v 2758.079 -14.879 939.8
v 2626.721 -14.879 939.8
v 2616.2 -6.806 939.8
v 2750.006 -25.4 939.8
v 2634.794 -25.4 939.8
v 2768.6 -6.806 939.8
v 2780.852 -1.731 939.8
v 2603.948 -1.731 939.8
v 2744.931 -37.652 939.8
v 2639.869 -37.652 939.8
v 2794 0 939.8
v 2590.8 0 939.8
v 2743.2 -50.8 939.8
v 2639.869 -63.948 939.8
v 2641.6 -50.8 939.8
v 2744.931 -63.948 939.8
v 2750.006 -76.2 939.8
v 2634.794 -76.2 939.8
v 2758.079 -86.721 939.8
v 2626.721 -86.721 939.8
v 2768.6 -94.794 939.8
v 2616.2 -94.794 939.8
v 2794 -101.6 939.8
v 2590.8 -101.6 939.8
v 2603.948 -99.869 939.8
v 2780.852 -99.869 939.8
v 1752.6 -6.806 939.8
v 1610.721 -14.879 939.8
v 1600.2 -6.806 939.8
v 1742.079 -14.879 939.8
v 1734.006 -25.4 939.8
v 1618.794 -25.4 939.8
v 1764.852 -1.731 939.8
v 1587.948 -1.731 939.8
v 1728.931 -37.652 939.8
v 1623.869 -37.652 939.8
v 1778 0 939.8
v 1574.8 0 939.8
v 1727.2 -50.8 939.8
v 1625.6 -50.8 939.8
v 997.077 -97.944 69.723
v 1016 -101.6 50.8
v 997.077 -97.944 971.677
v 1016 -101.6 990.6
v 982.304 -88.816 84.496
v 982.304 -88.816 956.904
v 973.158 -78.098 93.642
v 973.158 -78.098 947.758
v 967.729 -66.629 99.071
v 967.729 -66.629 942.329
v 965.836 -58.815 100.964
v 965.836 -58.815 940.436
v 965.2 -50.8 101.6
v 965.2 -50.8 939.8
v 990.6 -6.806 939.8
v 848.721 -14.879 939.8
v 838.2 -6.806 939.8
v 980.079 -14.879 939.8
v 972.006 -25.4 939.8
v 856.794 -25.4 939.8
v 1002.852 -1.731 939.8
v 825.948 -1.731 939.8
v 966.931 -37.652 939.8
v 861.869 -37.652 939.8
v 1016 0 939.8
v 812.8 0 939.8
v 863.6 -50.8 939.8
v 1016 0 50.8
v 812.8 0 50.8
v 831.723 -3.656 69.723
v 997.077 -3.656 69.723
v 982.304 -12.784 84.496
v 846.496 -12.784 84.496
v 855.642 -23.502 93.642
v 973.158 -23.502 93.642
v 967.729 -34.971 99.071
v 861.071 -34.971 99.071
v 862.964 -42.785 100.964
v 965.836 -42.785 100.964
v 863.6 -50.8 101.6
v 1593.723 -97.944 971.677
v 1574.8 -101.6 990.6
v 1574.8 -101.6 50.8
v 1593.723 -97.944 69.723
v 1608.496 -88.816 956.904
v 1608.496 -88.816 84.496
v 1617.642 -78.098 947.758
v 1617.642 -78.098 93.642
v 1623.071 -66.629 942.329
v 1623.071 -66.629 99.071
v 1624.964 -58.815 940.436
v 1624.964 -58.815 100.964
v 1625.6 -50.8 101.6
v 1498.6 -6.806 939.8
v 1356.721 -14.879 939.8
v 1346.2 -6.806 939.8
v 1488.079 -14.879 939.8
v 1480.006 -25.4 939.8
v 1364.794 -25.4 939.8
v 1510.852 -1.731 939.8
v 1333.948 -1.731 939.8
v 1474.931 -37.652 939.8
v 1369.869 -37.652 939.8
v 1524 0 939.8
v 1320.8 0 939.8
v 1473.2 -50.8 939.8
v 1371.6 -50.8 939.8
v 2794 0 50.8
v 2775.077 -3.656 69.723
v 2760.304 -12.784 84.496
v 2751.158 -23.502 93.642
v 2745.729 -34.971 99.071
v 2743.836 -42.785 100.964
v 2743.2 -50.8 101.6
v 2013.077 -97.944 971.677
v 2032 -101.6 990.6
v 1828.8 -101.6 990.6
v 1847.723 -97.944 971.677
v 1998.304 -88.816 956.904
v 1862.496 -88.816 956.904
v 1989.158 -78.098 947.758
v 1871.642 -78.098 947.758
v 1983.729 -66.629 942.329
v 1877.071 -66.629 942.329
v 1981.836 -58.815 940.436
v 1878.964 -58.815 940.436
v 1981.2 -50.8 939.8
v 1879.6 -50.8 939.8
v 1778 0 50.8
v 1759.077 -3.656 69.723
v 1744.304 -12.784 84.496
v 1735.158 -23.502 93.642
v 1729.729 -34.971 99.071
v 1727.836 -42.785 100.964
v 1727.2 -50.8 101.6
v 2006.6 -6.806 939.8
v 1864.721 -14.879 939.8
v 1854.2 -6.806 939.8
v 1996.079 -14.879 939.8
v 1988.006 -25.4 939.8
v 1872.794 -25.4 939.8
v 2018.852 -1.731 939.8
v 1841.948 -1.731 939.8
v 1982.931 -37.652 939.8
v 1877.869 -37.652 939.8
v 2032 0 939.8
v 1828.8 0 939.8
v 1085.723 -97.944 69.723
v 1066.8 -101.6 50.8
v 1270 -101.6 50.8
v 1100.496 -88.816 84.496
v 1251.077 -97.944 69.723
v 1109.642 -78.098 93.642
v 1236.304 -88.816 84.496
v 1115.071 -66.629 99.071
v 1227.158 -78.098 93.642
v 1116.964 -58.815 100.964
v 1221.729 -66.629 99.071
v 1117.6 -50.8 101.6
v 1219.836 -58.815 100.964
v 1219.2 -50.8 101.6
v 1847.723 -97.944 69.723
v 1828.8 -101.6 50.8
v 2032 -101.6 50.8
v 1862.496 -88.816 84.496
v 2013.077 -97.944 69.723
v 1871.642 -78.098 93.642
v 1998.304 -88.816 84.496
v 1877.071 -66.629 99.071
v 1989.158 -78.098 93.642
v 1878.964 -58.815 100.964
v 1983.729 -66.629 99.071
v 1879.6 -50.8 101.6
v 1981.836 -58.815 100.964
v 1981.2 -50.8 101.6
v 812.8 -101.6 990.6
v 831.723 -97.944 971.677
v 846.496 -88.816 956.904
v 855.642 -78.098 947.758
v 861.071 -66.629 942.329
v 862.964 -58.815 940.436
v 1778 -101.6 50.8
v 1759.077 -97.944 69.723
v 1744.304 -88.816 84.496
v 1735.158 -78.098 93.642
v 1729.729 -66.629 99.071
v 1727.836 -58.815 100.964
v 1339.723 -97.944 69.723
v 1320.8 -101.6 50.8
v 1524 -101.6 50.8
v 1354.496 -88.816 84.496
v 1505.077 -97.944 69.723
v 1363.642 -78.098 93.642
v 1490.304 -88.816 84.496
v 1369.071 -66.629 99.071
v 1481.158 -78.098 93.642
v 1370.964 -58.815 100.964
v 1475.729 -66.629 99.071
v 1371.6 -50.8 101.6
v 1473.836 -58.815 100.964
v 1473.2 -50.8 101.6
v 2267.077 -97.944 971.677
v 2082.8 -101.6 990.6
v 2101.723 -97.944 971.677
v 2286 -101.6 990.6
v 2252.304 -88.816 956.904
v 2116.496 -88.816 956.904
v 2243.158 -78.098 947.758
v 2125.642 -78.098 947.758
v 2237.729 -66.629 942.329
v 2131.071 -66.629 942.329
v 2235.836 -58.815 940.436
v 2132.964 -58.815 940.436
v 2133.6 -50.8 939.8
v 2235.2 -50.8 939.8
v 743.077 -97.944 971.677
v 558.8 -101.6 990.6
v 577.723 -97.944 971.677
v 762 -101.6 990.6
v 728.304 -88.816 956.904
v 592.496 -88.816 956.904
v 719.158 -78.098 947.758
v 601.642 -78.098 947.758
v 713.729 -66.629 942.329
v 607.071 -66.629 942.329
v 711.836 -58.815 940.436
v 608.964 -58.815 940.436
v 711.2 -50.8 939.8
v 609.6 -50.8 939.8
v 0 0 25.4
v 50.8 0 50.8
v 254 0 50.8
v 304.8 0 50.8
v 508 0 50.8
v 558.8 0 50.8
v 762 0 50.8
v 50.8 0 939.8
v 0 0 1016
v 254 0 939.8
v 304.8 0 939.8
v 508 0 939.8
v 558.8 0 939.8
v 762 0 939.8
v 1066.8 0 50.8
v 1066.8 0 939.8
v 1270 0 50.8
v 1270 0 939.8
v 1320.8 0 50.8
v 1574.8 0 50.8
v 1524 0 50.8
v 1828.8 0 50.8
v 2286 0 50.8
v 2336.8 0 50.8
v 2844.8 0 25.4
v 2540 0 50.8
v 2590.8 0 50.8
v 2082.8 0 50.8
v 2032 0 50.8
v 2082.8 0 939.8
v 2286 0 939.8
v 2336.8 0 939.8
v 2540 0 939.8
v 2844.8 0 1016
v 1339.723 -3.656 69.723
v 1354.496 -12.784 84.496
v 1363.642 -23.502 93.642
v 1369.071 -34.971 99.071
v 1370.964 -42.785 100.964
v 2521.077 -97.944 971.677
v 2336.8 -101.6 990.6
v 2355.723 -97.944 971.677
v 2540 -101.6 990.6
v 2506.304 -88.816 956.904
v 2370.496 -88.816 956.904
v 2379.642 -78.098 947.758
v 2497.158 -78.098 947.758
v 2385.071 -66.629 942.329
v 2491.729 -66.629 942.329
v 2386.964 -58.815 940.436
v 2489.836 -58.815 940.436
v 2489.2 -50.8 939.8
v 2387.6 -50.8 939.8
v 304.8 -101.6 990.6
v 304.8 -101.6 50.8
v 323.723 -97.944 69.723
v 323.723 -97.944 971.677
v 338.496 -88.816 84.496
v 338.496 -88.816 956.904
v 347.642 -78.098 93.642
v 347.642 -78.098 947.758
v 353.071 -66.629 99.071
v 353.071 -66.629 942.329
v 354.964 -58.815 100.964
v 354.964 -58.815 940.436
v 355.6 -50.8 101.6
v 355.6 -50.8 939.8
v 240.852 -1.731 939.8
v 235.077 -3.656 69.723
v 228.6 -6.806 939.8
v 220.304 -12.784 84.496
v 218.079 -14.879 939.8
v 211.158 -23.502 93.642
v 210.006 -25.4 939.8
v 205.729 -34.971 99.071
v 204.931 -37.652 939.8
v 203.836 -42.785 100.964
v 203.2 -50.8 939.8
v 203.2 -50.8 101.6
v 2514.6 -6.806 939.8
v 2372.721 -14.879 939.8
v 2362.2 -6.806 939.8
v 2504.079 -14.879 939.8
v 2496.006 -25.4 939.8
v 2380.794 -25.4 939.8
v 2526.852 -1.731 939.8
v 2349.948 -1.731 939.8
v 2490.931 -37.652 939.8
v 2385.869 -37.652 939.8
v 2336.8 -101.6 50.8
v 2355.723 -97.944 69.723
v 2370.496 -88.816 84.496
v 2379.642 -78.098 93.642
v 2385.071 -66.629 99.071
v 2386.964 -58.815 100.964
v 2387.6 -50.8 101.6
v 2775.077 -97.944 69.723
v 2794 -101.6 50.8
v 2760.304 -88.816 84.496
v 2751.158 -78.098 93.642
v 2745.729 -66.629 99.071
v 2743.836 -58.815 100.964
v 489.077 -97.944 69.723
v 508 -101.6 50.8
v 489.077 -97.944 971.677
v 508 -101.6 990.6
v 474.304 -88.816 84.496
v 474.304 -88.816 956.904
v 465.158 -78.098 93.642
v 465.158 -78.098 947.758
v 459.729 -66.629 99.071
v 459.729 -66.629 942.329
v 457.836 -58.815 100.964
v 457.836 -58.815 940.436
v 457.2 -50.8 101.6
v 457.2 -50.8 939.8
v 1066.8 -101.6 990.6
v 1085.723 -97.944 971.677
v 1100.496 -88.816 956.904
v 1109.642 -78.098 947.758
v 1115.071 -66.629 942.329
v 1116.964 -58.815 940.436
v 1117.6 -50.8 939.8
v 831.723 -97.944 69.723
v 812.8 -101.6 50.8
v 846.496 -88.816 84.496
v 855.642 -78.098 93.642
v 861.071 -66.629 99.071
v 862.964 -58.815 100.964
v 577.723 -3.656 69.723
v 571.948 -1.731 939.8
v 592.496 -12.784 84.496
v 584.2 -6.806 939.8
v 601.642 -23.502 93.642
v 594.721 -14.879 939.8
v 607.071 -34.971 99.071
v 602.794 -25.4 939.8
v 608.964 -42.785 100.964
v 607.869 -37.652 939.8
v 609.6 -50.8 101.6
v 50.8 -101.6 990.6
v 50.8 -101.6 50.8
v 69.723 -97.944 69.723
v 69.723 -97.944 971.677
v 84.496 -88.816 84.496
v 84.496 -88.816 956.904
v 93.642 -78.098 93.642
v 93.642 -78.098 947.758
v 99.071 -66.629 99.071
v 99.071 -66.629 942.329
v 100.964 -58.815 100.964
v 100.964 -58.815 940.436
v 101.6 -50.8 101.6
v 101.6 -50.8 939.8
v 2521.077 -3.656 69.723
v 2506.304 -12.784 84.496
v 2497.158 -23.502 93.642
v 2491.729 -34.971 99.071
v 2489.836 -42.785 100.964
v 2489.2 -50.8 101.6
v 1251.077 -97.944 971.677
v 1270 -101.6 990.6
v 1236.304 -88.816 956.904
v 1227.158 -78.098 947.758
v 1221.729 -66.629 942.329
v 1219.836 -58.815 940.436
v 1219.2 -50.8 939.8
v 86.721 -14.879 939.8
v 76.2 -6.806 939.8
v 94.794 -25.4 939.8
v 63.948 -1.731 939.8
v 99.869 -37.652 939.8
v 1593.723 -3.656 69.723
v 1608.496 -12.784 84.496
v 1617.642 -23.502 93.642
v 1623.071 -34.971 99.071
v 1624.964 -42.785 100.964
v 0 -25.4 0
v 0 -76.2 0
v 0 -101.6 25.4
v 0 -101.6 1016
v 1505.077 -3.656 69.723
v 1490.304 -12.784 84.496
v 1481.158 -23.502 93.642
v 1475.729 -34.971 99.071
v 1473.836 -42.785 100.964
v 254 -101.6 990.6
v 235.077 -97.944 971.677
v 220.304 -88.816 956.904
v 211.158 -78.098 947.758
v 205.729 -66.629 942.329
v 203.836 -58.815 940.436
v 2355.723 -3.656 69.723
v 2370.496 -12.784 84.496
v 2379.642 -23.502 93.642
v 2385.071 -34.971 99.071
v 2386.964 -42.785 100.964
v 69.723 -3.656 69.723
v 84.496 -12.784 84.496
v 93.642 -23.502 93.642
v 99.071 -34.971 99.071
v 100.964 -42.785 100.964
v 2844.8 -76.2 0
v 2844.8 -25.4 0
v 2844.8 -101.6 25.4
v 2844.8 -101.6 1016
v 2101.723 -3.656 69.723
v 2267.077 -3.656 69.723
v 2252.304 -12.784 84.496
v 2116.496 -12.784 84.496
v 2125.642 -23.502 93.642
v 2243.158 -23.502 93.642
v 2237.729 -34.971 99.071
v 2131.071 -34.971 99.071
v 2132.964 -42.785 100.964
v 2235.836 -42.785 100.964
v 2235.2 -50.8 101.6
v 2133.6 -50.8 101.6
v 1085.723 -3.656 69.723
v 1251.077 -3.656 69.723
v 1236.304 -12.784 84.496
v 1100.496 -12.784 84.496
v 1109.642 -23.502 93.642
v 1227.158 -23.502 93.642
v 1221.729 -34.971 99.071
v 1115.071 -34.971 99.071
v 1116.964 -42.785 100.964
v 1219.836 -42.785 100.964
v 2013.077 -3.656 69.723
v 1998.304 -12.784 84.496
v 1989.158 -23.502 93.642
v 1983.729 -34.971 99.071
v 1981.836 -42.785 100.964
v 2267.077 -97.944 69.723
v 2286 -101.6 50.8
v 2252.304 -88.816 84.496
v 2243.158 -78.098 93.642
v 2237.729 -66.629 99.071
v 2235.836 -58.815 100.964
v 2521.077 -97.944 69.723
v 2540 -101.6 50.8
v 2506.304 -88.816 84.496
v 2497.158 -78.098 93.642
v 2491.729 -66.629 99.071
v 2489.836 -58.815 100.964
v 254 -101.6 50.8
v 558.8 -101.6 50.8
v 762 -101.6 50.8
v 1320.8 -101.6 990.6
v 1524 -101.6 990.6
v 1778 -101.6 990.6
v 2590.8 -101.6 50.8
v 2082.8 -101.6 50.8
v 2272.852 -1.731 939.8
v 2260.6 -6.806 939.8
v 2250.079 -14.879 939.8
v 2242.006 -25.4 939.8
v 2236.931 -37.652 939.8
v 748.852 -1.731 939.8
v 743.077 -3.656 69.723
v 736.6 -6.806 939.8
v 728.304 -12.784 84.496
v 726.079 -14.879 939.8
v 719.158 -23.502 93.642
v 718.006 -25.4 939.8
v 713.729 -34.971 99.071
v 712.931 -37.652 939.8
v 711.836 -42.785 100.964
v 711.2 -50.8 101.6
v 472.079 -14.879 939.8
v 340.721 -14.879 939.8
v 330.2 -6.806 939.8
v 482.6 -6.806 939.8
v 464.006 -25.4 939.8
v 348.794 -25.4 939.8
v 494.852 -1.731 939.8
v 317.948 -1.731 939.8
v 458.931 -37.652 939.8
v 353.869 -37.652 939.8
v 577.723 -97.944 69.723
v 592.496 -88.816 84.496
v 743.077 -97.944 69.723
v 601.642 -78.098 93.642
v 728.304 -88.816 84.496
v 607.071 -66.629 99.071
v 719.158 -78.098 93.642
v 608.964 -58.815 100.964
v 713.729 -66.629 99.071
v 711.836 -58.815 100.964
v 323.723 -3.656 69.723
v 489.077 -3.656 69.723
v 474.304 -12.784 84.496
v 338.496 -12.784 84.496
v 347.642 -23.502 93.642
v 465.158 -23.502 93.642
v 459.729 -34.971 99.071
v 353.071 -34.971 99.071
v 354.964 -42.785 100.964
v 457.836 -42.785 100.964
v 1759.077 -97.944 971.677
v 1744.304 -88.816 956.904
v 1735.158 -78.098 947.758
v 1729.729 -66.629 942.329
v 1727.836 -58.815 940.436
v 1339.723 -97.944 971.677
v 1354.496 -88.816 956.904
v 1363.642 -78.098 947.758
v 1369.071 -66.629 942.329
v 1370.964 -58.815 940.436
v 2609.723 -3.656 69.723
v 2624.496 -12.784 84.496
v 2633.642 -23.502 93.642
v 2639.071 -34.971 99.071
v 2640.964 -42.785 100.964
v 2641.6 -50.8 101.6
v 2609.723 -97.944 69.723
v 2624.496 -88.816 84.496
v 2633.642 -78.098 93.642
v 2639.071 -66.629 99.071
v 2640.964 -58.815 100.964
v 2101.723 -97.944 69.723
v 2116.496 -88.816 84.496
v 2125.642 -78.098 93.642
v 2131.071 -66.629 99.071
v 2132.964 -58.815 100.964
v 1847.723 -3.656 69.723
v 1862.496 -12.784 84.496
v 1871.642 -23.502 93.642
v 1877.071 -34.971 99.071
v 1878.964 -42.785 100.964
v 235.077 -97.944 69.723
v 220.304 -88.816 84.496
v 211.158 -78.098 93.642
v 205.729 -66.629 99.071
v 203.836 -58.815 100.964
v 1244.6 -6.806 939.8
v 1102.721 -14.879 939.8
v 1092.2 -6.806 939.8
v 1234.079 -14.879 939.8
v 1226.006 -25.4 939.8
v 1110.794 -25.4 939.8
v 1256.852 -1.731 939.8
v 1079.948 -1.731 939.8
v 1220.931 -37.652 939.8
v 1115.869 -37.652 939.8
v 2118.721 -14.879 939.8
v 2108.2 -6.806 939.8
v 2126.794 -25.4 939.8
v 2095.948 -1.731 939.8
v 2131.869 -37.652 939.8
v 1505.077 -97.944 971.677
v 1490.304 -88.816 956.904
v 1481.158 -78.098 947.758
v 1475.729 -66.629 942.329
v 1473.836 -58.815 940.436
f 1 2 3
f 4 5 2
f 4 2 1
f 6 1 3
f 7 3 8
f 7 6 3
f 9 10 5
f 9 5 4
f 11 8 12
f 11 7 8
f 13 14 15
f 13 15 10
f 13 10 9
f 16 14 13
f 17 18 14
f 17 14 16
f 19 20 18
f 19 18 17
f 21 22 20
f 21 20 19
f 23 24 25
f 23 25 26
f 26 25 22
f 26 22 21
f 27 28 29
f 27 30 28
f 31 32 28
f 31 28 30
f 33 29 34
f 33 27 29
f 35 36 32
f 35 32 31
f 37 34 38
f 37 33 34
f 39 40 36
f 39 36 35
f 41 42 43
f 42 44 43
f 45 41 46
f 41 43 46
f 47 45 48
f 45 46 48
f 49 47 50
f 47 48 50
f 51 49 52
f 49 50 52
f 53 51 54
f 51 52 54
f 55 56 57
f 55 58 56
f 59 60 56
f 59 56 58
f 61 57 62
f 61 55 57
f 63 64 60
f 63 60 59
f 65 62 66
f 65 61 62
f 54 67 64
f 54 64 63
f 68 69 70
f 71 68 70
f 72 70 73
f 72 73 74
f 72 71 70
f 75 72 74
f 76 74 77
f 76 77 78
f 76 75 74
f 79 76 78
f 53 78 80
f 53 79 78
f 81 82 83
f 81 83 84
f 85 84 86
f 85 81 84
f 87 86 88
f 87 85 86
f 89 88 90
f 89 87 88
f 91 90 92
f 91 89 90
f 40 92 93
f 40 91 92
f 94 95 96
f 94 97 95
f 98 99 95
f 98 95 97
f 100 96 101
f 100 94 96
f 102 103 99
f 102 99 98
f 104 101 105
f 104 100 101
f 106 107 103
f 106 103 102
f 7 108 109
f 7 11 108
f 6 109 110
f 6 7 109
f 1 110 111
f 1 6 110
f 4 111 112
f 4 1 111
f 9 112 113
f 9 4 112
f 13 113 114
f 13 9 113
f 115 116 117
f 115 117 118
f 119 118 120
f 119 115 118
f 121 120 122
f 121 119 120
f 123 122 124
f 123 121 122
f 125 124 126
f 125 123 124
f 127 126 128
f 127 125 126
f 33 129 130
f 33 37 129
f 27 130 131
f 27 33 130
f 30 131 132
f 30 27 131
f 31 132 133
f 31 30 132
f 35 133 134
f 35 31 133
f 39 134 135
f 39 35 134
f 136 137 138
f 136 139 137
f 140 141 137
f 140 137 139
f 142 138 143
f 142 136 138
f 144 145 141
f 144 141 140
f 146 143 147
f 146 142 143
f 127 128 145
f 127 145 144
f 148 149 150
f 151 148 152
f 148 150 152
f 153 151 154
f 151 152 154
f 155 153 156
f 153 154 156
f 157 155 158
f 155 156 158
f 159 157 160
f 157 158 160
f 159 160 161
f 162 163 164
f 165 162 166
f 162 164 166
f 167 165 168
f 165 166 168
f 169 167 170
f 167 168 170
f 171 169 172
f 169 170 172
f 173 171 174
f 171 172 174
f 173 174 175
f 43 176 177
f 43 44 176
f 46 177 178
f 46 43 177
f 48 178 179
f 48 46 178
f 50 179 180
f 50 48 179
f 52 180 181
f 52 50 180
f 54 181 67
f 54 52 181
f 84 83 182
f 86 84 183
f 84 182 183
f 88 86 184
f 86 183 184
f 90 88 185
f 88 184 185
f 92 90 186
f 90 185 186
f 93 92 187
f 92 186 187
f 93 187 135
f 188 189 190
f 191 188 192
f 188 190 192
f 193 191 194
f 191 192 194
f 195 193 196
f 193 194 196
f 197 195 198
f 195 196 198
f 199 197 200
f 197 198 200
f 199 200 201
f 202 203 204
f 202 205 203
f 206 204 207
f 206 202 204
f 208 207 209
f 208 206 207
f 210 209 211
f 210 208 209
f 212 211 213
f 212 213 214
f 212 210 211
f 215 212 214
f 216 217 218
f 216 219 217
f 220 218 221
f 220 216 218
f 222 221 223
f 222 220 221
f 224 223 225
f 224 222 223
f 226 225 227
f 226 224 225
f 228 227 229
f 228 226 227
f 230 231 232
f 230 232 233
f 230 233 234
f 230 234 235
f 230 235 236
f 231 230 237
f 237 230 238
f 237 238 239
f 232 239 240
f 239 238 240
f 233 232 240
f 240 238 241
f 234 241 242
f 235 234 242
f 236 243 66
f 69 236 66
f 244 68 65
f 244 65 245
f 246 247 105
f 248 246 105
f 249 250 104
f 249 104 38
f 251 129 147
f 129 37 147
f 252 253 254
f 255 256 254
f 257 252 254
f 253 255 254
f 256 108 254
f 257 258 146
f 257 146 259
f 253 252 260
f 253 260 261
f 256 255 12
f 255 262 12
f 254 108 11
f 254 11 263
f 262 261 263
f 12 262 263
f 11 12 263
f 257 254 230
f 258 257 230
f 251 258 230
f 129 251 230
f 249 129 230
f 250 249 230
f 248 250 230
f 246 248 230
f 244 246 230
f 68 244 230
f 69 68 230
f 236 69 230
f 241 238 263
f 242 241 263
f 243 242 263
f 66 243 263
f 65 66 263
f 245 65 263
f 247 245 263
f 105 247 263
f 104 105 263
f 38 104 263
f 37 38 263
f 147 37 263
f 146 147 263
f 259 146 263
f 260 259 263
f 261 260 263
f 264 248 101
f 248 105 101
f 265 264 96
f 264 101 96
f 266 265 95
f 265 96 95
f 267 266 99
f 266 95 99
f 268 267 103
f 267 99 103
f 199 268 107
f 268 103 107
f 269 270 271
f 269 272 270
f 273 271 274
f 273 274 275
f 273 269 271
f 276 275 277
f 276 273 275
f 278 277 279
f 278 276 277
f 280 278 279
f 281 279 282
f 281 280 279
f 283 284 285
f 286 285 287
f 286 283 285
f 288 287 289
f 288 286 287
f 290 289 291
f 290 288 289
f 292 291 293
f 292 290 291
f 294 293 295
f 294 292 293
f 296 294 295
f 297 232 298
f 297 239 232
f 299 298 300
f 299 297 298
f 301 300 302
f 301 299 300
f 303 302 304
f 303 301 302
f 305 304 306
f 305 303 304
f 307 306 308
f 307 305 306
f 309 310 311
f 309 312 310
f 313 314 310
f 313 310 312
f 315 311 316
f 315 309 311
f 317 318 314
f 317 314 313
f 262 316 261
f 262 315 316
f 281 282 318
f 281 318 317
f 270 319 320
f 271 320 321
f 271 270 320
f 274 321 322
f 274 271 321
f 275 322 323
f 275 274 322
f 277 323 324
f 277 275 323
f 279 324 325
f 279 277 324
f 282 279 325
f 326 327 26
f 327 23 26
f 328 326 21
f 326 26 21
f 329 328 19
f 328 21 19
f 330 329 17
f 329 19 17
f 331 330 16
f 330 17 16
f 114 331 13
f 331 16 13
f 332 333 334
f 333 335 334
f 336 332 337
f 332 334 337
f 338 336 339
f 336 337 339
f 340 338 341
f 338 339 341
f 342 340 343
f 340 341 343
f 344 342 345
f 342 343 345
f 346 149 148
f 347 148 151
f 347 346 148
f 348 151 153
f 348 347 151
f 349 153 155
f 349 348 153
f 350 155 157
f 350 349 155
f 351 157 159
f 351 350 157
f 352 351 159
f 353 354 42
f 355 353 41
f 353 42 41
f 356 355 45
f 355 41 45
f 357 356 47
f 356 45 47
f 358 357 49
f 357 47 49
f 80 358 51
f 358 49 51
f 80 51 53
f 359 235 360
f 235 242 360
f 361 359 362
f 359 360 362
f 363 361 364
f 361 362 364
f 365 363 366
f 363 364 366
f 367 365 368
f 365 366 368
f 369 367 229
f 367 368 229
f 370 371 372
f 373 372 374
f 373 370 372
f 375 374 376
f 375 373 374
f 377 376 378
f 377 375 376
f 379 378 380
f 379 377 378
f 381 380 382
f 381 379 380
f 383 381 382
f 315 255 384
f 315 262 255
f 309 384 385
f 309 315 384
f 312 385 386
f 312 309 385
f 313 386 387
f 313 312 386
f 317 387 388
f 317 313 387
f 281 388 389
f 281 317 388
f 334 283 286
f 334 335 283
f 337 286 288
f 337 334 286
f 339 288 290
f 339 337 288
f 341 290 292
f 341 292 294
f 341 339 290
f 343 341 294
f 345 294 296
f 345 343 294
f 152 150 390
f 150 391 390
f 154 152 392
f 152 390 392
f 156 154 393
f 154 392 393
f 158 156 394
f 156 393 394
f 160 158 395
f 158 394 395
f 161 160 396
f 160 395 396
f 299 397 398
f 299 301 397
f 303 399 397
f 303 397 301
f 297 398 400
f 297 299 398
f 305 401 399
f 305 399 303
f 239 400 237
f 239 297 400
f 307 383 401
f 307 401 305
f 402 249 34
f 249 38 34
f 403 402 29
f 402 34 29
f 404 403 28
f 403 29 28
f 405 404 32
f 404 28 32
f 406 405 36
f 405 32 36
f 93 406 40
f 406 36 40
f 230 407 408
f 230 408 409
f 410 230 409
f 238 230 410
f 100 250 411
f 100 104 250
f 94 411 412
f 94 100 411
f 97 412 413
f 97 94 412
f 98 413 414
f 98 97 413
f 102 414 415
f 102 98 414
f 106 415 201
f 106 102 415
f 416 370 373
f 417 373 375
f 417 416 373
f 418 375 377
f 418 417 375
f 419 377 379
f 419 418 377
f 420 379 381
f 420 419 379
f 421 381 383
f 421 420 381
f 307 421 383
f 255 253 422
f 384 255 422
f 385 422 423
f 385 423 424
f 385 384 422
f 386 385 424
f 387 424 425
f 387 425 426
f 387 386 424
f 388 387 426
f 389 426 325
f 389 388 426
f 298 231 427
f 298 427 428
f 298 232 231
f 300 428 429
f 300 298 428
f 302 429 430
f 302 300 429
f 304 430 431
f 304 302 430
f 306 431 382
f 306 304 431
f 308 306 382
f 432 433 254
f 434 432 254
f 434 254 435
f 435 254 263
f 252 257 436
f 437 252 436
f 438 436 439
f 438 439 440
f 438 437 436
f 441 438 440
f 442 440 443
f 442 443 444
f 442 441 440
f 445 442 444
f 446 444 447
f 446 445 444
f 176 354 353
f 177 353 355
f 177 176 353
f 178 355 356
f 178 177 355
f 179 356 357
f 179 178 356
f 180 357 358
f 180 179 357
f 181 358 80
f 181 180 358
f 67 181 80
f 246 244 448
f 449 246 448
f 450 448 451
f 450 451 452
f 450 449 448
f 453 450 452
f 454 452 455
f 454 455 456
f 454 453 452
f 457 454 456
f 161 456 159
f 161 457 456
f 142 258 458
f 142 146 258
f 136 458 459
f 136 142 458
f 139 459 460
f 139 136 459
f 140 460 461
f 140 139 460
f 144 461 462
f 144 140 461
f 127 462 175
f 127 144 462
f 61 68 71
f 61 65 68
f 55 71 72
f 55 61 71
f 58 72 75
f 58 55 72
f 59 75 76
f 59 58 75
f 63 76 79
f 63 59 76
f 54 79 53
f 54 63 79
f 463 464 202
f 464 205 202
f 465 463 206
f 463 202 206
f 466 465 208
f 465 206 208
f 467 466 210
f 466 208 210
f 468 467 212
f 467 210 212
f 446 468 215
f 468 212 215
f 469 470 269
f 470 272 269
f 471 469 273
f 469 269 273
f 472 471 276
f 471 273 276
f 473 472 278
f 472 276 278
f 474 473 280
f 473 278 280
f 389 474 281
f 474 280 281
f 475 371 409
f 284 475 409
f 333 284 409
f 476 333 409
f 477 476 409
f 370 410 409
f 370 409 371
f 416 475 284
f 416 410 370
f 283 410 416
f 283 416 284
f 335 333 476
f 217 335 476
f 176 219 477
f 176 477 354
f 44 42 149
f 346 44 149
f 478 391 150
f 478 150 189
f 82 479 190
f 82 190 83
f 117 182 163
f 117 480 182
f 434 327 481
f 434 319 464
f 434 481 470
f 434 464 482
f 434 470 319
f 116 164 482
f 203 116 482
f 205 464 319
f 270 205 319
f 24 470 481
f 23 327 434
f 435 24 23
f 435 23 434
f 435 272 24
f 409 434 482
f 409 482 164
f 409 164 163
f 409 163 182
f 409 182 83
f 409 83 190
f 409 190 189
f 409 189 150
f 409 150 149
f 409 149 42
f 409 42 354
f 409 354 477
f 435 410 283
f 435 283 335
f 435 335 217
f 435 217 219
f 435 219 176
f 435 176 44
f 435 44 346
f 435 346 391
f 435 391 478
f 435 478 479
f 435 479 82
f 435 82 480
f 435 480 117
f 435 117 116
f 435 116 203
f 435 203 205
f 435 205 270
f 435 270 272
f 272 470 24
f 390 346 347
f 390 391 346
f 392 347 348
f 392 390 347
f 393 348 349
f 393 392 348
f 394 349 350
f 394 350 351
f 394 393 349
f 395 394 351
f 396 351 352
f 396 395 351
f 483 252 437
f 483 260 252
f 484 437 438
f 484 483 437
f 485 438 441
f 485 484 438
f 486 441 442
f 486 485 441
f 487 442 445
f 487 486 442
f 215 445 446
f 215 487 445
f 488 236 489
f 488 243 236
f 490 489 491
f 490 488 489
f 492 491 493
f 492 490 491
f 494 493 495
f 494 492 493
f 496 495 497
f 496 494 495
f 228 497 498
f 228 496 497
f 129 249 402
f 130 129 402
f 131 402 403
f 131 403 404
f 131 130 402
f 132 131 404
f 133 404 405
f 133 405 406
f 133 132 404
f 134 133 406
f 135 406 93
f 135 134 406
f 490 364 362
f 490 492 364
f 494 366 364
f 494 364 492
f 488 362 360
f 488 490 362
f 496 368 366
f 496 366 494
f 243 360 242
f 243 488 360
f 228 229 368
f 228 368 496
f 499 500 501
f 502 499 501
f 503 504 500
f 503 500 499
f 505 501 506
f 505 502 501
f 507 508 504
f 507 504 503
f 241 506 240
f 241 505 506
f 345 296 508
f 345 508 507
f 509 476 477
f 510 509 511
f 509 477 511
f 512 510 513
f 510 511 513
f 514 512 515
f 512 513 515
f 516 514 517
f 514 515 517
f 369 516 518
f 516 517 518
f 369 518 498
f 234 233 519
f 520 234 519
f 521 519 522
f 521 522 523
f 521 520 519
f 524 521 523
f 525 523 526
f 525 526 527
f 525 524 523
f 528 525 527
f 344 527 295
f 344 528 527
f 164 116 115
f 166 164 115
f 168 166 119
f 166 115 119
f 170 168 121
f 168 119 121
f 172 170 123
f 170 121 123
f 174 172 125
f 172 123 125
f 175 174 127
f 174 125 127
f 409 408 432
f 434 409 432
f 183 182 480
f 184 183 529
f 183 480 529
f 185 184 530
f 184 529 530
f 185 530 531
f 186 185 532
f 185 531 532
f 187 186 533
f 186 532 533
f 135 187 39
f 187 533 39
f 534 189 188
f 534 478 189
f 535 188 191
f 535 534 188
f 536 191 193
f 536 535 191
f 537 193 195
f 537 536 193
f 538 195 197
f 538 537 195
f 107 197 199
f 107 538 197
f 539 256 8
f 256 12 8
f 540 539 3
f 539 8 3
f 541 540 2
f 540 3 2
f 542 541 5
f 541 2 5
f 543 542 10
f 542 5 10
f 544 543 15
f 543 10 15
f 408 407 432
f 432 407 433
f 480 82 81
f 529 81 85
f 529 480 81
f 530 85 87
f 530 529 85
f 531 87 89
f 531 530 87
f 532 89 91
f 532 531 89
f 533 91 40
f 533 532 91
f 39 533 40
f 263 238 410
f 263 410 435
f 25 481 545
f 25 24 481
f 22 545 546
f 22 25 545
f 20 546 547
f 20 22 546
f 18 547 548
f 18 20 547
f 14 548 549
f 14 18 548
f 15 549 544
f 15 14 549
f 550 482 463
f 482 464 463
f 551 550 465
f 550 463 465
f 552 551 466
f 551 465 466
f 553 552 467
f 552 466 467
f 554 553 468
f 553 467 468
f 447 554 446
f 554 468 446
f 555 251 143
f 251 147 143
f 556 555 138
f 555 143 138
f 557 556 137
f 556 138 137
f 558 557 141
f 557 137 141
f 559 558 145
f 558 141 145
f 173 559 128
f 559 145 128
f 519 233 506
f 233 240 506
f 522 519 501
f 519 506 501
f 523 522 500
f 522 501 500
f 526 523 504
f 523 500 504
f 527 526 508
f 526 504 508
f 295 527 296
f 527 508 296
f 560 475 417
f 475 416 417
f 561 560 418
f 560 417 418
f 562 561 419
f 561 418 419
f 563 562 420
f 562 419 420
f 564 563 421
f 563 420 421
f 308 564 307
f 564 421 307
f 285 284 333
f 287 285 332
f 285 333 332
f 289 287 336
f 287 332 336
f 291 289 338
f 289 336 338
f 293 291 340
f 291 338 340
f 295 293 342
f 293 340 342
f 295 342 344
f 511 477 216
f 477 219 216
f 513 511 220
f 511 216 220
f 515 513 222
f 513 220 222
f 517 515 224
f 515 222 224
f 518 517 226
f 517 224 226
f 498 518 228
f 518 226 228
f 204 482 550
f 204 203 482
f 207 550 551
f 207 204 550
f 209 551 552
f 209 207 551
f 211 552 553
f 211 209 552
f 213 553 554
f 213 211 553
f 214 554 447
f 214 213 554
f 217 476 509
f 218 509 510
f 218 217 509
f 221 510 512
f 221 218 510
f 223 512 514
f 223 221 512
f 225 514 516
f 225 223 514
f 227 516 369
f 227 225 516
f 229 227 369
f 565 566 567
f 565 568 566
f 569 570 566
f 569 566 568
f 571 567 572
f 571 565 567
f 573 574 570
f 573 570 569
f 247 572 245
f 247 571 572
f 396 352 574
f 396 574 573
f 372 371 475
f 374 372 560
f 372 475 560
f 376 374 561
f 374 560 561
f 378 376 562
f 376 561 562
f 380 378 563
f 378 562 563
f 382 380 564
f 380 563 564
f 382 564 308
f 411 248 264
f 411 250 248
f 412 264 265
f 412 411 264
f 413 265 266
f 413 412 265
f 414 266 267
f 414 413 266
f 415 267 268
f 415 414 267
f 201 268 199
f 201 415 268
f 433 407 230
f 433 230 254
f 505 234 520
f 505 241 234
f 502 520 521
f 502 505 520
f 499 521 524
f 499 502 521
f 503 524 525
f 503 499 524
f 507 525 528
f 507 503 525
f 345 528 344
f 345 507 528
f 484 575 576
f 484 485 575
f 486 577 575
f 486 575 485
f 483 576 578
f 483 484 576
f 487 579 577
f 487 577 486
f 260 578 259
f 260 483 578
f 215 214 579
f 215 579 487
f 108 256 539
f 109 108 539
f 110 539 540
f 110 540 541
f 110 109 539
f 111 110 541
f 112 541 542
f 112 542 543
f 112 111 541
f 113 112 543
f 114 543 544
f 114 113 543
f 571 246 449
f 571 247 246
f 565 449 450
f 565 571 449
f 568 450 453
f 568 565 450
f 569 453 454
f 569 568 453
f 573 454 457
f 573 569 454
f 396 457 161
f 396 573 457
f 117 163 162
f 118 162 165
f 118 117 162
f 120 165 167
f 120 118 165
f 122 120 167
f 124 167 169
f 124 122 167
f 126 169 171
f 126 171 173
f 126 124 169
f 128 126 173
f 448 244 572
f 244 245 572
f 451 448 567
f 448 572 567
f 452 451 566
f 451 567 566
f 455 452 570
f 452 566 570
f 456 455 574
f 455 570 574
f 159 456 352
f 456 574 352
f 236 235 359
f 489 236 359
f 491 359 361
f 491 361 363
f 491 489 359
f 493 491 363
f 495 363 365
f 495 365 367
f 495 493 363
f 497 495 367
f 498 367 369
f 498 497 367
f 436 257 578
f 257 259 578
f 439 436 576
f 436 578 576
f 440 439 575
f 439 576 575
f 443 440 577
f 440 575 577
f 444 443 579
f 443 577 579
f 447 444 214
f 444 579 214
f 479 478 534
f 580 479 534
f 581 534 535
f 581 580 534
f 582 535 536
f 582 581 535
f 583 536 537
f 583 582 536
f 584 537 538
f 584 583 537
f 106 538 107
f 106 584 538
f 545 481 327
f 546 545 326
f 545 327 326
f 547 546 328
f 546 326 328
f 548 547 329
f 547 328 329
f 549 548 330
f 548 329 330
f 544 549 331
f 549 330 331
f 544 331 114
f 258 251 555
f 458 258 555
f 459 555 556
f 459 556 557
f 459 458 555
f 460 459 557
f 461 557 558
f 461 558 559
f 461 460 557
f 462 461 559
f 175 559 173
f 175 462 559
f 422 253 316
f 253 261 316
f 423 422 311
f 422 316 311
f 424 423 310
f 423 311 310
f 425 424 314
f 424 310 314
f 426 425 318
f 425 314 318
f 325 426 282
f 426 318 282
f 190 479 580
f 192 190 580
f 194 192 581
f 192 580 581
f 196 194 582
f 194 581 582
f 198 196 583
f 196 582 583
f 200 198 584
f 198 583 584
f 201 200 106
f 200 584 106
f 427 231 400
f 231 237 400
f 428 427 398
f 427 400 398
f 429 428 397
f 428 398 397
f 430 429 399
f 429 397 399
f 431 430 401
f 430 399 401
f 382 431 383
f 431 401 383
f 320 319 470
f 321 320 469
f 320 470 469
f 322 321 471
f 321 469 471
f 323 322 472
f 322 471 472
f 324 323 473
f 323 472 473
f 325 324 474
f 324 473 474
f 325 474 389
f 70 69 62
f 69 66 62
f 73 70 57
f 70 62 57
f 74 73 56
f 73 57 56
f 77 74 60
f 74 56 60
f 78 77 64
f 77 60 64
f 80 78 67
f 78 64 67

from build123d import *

# Parameters (mm, degrees)
F0_W     = 2844.8
F0_H     = 1016
F1_DEPTH = 101.6
F2_W     = 101.6
F2_H     = 838.2
F3_DEPTH = 307.34
F4_R     = 50.79999
F5_SIZE  = 25.4


# Not quite as in the source:
# - a fillet or chamfer is up to 0.001 mm smaller than in the source, because OpenCascade refuses the exact size


with BuildPart() as f1:
    # F0 (on Front) → F1 (new body)
    with BuildSketch(Plane.XZ):
        with Locations((1422.4, 508)):
            Rectangle(F0_W, F0_H)
    extrude(amount=F1_DEPTH)

    # F2 (on face) → F3 (cut)
    with BuildSketch(Plane.XZ.offset(101.6)):
        with Locations((152.4, 520.7)):
            Rectangle(F2_W, F2_H)
        with Locations((406.4, 520.7)):
            Rectangle(F2_W, F2_H)
        with Locations((660.4, 520.7)):
            Rectangle(F2_W, F2_H)
        with Locations((914.4, 520.7)):
            Rectangle(F2_W, F2_H)
        with Locations((1168.4, 520.7)):
            Rectangle(F2_W, F2_H)
        with Locations((1422.4, 520.7)):
            Rectangle(F2_W, F2_H)
        with Locations((1676.4, 520.7)):
            Rectangle(F2_W, F2_H)
        with Locations((1930.4, 520.7)):
            Rectangle(F2_W, F2_H)
        with Locations((2184.4, 520.7)):
            Rectangle(F2_W, F2_H)
        with Locations((2438.4, 520.7)):
            Rectangle(F2_W, F2_H)
        with Locations((2692.4, 520.7)):
            Rectangle(F2_W, F2_H)
    extrude(amount=-F3_DEPTH, mode=Mode.SUBTRACT)

    # F4 (radius 50.8 in the source; OpenCascade refuses exactly that, so slightly less here)
    f4_edges = [f1.edges().sort_by_distance(p)[0] for p in [
        (101.6, -101.6, 520.7),
        (152.4, -101.6, 939.8),
        (203.2, -101.6, 520.7),
        (152.4, -101.6, 101.6),
        (355.6, -101.6, 520.7),
        (406.4, -101.6, 939.8),
        (457.2, -101.6, 520.7),
        (406.4, -101.6, 101.6),
        (609.6, -101.6, 520.7),
        (660.4, -101.6, 101.6),
        (711.2, -101.6, 520.7),
        (660.4, -101.6, 939.8),
        (863.6, -101.6, 520.7),
        (914.4, -101.6, 939.8),
        (965.2, -101.6, 520.7),
        (914.4, -101.6, 101.6),
        (1117.6, -101.6, 520.7),
        (1168.4, -101.6, 101.6),
        (1219.2, -101.6, 520.7),
        (1168.4, -101.6, 939.8),
        (1422.4, -101.6, 939.8),
        (1371.6, -101.6, 520.7),
        (1473.2, -101.6, 520.7),
        (1422.4, -101.6, 101.6),
        (1676.4, -101.6, 101.6),
        (1625.6, -101.6, 520.7),
        (1727.2, -101.6, 520.7),
        (1676.4, -101.6, 939.8),
        (1879.6, -101.6, 520.7),
        (1930.4, -101.6, 939.8),
        (1981.2, -101.6, 520.7),
        (1930.4, -101.6, 101.6),
        (2184.4, -101.6, 101.6),
        (2133.6, -101.6, 520.7),
        (2235.2, -101.6, 520.7),
        (2184.4, -101.6, 939.8),
        (2438.4, -101.6, 939.8),
        (2387.6, -101.6, 520.7),
        (2489.2, -101.6, 520.7),
        (2438.4, -101.6, 101.6),
        (2641.6, -101.6, 520.7),
        (2692.4, -101.6, 101.6),
        (2743.2, -101.6, 520.7),
        (152.4, 0, 101.6),
        (101.6, 0, 520.7),
        (203.2, 0, 520.7),
        (355.6, 0, 520.7),
        (406.4, 0, 101.6),
        (457.2, 0, 520.7),
        (609.6, 0, 520.7),
        (660.4, 0, 101.6),
        (711.2, 0, 520.7),
        (863.6, 0, 520.7),
        (914.4, 0, 101.6),
        (965.2, 0, 520.7),
        (1117.6, 0, 520.7),
        (1168.4, 0, 101.6),
        (1219.2, 0, 520.7),
        (1422.4, 0, 101.6),
        (1473.2, 0, 520.7),
        (1371.6, 0, 520.7),
        (1625.6, 0, 520.7),
        (1676.4, 0, 101.6),
        (1727.2, 0, 520.7),
        (1879.6, 0, 520.7),
        (1930.4, 0, 101.6),
        (1981.2, 0, 520.7),
        (2133.6, 0, 520.7),
        (2184.4, 0, 101.6),
        (2235.2, 0, 520.7),
        (2387.6, 0, 520.7),
        (2438.4, 0, 101.6),
        (2489.2, 0, 520.7),
        (2641.6, 0, 520.7),
        (2692.4, 0, 101.6),
        (2743.2, 0, 520.7),
    ]]
    fillet(f4_edges, radius=F4_R)

    # F5
    f5_edges = [f1.edges().sort_by_distance(p)[0] for p in [
        (1422.4, 0, 0),
        (1422.4, -101.6, 0),
    ]]
    chamfer(f5_edges, length=F5_SIZE)


solid = f1.part
